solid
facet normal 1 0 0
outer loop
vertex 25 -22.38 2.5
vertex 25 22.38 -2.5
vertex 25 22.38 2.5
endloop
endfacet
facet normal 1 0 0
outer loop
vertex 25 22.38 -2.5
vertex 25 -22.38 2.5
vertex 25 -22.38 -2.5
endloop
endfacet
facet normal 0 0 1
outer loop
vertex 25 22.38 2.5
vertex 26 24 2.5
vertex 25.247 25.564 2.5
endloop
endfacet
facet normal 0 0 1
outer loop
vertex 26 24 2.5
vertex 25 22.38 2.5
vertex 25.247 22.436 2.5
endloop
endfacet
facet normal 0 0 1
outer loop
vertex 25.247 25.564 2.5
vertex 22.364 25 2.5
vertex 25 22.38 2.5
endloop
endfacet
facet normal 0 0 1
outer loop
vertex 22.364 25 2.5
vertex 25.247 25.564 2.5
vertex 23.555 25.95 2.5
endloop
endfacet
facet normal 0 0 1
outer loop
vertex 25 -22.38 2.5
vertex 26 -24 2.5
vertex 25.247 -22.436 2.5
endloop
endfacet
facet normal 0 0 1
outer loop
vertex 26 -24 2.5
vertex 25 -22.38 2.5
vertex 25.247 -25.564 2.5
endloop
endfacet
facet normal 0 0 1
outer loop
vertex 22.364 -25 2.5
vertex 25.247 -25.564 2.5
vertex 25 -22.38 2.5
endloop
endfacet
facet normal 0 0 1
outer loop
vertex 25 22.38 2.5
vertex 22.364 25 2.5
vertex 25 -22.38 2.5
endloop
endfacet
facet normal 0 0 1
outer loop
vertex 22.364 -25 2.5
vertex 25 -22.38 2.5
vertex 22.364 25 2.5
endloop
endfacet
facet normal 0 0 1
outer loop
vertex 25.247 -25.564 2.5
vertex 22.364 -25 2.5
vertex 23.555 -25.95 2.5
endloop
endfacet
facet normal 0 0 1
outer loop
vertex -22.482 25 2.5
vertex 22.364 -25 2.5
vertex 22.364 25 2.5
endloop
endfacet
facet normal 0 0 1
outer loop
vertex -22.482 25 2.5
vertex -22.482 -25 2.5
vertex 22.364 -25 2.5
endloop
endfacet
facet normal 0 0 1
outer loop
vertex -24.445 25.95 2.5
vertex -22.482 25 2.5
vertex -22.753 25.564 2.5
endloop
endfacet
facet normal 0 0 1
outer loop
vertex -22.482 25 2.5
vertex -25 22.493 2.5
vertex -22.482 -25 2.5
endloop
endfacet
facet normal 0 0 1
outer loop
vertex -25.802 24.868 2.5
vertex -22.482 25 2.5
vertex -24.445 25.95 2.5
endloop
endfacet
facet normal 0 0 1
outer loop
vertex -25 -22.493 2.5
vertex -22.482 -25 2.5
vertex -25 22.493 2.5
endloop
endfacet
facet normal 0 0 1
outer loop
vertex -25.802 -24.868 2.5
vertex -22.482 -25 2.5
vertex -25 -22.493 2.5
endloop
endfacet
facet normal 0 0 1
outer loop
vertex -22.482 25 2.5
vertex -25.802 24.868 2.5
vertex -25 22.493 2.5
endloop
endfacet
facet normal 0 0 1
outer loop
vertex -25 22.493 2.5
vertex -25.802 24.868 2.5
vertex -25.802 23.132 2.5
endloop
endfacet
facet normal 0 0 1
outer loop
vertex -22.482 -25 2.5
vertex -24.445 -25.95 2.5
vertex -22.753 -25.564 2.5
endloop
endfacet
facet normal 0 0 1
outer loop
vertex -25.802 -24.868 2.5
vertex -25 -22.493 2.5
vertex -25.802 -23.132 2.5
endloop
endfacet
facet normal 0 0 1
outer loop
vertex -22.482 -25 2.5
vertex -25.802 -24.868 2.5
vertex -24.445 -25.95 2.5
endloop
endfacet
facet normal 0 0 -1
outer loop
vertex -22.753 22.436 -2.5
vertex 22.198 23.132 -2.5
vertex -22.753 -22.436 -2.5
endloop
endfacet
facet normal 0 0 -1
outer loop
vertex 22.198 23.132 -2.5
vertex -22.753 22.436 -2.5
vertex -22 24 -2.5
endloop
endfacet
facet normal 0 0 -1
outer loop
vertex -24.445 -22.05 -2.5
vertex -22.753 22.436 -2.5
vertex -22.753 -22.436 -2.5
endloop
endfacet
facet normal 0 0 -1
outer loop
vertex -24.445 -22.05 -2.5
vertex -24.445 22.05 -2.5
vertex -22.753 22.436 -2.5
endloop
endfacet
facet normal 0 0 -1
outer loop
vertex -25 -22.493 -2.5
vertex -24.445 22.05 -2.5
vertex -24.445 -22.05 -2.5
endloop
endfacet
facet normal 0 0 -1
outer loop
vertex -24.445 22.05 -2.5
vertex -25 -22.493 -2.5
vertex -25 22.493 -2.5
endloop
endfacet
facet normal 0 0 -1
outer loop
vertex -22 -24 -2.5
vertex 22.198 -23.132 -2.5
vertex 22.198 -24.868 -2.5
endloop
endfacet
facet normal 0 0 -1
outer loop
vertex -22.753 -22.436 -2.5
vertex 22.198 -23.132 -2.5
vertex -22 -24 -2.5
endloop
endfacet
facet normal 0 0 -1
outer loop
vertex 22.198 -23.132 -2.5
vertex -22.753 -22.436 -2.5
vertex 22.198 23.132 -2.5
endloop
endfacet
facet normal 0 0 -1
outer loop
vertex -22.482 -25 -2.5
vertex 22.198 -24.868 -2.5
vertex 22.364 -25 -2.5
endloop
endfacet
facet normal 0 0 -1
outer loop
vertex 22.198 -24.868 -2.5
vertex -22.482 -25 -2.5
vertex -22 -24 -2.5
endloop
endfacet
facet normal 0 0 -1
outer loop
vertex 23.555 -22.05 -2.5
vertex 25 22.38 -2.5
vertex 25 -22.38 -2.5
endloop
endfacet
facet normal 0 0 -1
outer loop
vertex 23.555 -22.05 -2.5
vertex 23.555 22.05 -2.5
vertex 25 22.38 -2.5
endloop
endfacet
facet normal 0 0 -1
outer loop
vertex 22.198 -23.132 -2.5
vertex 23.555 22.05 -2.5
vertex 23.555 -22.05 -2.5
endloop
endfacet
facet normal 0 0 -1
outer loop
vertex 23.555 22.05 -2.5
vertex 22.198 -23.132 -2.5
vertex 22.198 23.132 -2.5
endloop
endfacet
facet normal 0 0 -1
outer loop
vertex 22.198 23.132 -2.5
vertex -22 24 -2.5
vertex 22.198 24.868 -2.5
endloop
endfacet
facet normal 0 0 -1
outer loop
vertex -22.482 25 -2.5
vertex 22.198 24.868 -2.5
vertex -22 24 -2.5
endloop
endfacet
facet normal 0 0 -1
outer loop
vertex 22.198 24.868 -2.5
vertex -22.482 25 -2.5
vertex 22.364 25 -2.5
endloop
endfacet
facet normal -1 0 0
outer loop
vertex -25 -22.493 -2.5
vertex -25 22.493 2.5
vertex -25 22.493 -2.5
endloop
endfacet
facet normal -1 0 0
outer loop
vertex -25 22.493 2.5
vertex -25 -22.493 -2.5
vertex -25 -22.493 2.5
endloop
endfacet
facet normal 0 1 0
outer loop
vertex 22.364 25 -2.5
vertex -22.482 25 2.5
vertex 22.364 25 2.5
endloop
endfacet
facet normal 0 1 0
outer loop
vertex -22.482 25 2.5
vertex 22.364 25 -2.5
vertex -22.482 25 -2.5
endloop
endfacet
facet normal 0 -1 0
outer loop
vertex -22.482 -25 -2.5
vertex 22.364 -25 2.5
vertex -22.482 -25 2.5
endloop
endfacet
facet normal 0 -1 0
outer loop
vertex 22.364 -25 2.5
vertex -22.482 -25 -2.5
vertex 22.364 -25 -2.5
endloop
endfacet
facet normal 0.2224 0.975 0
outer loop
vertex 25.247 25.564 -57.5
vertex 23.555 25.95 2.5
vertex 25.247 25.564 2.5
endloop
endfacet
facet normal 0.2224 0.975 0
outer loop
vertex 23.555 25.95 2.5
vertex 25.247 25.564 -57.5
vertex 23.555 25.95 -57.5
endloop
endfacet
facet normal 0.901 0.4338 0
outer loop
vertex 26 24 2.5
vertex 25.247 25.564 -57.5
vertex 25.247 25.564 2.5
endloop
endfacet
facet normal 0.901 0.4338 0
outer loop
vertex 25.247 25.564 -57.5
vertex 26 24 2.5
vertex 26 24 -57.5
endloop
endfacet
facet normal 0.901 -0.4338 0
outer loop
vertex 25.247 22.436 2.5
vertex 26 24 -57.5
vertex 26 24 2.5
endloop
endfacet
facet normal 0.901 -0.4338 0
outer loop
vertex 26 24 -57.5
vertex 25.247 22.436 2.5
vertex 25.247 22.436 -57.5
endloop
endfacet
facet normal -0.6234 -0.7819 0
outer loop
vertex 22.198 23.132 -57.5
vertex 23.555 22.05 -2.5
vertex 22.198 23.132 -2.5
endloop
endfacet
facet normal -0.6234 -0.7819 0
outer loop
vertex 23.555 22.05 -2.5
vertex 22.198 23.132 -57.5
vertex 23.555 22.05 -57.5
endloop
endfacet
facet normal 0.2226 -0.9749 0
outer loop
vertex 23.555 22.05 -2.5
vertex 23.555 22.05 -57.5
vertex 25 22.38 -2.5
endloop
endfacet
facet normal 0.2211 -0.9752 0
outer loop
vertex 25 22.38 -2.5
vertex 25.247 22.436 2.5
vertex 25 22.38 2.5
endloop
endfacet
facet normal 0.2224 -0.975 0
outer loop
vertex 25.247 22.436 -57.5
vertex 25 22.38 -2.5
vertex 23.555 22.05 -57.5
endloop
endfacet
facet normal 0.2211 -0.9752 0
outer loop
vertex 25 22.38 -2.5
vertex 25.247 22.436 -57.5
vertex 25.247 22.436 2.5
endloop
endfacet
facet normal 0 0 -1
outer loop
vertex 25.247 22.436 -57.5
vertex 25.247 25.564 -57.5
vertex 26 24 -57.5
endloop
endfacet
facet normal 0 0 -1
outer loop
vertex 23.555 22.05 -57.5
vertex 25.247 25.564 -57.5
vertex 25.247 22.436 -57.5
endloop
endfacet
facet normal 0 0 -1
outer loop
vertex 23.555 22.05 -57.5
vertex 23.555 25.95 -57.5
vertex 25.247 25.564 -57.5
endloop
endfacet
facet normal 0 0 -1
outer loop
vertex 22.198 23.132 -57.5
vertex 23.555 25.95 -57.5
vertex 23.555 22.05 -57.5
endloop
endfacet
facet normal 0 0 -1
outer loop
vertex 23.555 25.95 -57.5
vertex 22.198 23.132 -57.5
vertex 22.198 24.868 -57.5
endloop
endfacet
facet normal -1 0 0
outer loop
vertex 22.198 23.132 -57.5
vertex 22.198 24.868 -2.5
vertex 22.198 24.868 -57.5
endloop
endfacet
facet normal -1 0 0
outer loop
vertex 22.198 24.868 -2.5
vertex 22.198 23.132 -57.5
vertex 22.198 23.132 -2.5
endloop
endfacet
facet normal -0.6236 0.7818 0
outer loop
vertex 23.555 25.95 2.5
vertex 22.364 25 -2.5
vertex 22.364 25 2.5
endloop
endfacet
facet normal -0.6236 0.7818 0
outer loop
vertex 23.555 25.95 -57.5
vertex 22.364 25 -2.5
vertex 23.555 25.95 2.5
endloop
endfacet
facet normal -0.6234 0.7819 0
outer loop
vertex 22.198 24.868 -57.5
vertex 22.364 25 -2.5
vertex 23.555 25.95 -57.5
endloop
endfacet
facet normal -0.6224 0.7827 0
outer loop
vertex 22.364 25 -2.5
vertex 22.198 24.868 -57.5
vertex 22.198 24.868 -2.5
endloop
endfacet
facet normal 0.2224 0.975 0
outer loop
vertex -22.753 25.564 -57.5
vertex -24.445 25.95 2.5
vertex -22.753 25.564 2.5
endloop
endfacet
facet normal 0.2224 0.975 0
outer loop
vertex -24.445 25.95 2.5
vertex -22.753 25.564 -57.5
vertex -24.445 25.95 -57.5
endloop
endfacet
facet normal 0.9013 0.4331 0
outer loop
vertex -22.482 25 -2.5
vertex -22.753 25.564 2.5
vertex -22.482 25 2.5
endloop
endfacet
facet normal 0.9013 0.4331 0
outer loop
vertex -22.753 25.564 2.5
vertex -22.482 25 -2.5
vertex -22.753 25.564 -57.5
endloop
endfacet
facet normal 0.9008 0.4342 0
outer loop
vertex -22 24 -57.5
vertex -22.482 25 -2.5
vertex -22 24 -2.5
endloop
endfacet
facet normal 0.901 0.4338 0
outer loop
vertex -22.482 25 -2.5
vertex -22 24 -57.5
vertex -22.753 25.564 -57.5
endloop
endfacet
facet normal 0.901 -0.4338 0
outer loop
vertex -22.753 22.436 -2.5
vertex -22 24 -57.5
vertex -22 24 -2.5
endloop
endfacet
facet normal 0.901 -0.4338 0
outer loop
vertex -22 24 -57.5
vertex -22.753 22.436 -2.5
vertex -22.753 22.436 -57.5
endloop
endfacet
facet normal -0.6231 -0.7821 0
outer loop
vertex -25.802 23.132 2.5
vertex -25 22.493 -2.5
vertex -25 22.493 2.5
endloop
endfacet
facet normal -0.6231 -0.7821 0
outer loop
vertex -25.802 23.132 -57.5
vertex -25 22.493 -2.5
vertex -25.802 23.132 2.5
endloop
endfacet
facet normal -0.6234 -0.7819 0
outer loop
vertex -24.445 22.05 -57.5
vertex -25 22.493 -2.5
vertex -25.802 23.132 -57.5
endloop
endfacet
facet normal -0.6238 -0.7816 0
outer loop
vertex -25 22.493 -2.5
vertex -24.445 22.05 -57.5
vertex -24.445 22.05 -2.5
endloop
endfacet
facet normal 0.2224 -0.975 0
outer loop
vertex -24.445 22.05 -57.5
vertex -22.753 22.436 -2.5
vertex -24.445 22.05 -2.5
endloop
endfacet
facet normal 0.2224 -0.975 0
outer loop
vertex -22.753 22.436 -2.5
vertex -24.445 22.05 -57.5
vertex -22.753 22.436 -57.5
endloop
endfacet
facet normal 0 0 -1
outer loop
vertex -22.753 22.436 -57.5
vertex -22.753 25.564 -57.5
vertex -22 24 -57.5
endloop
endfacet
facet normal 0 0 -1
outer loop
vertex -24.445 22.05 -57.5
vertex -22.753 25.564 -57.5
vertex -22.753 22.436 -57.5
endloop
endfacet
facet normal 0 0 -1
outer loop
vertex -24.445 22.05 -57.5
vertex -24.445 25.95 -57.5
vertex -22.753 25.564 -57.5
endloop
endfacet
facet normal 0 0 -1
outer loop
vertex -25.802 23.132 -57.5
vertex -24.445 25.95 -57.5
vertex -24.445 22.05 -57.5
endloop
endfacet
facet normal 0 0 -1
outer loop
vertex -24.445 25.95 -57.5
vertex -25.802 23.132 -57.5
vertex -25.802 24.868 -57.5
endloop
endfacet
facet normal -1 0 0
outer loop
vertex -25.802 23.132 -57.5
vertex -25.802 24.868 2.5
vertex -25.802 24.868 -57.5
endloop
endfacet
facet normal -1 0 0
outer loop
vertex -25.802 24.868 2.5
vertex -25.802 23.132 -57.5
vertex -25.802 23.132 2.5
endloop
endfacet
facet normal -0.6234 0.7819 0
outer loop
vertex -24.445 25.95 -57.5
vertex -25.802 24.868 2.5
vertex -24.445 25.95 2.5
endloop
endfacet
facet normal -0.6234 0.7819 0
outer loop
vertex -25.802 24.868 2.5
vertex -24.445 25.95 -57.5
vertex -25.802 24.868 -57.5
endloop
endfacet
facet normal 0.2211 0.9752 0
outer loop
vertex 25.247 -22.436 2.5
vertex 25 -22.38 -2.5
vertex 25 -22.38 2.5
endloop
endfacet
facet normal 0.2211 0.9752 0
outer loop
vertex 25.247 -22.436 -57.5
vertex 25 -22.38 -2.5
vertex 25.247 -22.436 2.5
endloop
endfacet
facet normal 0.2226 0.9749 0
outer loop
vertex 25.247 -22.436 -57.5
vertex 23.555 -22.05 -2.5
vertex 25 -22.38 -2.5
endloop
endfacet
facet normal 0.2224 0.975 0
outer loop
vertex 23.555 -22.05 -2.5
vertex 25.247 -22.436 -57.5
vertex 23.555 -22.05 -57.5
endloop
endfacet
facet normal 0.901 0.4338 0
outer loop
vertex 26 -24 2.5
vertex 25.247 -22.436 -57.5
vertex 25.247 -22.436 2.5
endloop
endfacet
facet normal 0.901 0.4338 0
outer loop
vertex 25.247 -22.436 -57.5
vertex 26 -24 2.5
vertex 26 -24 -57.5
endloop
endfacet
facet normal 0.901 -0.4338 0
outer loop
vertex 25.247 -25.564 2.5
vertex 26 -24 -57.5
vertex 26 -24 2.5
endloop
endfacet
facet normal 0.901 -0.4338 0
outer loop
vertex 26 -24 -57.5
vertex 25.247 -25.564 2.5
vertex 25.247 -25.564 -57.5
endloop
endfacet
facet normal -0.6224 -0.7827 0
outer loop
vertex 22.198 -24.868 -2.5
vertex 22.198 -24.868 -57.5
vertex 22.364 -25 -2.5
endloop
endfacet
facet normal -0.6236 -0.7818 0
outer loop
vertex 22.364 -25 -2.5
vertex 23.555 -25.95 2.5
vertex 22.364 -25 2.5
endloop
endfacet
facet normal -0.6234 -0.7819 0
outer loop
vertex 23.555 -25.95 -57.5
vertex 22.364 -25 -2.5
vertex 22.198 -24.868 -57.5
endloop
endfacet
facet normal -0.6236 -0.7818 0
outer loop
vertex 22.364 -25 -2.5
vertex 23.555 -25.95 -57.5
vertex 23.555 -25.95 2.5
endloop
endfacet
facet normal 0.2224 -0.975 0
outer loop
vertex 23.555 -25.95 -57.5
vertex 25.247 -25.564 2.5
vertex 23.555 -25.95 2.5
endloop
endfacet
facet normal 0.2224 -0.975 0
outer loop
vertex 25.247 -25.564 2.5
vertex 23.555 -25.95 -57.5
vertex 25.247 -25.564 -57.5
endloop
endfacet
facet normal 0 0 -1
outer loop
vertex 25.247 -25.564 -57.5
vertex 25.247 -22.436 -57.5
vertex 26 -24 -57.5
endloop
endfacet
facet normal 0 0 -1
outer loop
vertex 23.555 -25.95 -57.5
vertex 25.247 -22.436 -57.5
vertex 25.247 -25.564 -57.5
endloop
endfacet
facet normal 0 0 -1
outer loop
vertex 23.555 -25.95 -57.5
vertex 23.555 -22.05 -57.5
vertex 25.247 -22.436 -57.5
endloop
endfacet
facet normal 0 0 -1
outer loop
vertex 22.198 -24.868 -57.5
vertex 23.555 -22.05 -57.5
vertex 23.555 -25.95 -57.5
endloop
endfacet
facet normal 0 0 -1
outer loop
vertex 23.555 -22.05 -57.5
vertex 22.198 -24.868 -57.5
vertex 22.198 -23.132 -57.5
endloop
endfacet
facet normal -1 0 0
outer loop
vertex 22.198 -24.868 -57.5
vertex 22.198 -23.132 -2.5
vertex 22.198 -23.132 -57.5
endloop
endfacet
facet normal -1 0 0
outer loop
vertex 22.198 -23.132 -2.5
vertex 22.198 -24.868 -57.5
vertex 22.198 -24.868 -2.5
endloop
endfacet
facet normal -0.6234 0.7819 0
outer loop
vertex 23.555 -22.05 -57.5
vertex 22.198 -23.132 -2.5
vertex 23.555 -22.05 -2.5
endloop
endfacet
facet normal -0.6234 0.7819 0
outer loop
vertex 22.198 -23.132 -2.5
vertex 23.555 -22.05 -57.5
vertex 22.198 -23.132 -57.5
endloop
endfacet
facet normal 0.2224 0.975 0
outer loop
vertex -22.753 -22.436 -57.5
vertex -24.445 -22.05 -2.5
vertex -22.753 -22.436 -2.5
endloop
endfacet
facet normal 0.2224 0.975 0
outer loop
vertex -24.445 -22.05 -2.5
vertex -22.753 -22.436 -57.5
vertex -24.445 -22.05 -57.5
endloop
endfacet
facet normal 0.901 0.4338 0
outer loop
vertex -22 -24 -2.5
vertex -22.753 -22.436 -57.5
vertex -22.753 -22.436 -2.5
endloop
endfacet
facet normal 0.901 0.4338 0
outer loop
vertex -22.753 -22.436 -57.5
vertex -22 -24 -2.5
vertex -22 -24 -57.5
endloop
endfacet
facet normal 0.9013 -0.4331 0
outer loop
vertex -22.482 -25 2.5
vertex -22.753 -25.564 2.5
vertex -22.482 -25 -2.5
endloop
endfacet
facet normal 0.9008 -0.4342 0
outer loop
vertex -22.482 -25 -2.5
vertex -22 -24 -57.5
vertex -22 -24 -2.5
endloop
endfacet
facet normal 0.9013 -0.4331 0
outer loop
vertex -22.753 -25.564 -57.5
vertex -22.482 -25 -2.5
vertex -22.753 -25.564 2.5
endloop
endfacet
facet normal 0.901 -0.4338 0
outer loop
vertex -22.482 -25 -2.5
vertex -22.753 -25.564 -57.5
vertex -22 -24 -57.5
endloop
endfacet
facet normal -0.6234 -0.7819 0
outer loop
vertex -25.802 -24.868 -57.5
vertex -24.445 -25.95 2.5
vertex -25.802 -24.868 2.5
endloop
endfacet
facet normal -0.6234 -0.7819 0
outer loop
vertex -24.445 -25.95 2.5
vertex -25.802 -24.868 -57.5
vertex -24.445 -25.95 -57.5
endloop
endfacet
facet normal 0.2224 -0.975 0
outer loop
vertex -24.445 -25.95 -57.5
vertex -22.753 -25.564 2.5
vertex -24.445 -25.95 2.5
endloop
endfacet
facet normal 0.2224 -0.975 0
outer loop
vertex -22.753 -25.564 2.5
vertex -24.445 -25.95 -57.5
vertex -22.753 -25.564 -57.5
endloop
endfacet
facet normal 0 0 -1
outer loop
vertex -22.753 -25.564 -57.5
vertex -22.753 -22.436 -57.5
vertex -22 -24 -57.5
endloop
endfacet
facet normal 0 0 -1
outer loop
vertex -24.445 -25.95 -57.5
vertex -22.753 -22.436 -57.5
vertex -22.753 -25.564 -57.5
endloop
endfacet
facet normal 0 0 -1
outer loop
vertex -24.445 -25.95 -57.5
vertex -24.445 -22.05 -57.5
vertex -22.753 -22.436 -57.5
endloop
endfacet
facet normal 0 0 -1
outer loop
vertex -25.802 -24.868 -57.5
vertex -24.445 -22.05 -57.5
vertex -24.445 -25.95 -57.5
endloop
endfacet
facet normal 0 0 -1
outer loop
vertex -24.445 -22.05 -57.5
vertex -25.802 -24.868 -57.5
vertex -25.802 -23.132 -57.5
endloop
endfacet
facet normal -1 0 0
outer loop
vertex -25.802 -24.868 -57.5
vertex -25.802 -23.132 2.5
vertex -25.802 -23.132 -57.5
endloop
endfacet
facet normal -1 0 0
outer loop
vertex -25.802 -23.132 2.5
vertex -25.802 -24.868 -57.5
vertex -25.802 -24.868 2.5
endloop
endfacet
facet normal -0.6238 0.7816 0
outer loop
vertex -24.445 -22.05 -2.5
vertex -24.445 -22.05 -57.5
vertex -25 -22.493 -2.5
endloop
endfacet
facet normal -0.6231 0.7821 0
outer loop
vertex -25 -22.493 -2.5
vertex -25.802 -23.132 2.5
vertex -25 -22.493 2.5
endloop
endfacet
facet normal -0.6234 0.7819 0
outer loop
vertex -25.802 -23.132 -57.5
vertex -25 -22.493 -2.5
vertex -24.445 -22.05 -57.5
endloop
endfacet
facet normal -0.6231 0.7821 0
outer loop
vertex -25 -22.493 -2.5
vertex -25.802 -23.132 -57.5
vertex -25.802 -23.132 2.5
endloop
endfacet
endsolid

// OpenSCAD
// Tabletop
cube([50, 50, 5], center=true);

// Legs
translate([50/2-2/2, 50/2-2/2, -50/2 - 5/2]) cylinder(h=60, r=2, center=true);
translate([-(50/2-2/2), 50/2-2/2, -50/2 - 5/2]) cylinder(h=60, r=2, center=true);
translate([50/2-2/2, -(50/2-2/2), -50/2 - 5/2]) cylinder(h=60, r=2, center=true);
translate([-(50/2-2/2), -(50/2-2/2), -50/2 - 5/2]) cylinder(h=60, r=2, center=true);
